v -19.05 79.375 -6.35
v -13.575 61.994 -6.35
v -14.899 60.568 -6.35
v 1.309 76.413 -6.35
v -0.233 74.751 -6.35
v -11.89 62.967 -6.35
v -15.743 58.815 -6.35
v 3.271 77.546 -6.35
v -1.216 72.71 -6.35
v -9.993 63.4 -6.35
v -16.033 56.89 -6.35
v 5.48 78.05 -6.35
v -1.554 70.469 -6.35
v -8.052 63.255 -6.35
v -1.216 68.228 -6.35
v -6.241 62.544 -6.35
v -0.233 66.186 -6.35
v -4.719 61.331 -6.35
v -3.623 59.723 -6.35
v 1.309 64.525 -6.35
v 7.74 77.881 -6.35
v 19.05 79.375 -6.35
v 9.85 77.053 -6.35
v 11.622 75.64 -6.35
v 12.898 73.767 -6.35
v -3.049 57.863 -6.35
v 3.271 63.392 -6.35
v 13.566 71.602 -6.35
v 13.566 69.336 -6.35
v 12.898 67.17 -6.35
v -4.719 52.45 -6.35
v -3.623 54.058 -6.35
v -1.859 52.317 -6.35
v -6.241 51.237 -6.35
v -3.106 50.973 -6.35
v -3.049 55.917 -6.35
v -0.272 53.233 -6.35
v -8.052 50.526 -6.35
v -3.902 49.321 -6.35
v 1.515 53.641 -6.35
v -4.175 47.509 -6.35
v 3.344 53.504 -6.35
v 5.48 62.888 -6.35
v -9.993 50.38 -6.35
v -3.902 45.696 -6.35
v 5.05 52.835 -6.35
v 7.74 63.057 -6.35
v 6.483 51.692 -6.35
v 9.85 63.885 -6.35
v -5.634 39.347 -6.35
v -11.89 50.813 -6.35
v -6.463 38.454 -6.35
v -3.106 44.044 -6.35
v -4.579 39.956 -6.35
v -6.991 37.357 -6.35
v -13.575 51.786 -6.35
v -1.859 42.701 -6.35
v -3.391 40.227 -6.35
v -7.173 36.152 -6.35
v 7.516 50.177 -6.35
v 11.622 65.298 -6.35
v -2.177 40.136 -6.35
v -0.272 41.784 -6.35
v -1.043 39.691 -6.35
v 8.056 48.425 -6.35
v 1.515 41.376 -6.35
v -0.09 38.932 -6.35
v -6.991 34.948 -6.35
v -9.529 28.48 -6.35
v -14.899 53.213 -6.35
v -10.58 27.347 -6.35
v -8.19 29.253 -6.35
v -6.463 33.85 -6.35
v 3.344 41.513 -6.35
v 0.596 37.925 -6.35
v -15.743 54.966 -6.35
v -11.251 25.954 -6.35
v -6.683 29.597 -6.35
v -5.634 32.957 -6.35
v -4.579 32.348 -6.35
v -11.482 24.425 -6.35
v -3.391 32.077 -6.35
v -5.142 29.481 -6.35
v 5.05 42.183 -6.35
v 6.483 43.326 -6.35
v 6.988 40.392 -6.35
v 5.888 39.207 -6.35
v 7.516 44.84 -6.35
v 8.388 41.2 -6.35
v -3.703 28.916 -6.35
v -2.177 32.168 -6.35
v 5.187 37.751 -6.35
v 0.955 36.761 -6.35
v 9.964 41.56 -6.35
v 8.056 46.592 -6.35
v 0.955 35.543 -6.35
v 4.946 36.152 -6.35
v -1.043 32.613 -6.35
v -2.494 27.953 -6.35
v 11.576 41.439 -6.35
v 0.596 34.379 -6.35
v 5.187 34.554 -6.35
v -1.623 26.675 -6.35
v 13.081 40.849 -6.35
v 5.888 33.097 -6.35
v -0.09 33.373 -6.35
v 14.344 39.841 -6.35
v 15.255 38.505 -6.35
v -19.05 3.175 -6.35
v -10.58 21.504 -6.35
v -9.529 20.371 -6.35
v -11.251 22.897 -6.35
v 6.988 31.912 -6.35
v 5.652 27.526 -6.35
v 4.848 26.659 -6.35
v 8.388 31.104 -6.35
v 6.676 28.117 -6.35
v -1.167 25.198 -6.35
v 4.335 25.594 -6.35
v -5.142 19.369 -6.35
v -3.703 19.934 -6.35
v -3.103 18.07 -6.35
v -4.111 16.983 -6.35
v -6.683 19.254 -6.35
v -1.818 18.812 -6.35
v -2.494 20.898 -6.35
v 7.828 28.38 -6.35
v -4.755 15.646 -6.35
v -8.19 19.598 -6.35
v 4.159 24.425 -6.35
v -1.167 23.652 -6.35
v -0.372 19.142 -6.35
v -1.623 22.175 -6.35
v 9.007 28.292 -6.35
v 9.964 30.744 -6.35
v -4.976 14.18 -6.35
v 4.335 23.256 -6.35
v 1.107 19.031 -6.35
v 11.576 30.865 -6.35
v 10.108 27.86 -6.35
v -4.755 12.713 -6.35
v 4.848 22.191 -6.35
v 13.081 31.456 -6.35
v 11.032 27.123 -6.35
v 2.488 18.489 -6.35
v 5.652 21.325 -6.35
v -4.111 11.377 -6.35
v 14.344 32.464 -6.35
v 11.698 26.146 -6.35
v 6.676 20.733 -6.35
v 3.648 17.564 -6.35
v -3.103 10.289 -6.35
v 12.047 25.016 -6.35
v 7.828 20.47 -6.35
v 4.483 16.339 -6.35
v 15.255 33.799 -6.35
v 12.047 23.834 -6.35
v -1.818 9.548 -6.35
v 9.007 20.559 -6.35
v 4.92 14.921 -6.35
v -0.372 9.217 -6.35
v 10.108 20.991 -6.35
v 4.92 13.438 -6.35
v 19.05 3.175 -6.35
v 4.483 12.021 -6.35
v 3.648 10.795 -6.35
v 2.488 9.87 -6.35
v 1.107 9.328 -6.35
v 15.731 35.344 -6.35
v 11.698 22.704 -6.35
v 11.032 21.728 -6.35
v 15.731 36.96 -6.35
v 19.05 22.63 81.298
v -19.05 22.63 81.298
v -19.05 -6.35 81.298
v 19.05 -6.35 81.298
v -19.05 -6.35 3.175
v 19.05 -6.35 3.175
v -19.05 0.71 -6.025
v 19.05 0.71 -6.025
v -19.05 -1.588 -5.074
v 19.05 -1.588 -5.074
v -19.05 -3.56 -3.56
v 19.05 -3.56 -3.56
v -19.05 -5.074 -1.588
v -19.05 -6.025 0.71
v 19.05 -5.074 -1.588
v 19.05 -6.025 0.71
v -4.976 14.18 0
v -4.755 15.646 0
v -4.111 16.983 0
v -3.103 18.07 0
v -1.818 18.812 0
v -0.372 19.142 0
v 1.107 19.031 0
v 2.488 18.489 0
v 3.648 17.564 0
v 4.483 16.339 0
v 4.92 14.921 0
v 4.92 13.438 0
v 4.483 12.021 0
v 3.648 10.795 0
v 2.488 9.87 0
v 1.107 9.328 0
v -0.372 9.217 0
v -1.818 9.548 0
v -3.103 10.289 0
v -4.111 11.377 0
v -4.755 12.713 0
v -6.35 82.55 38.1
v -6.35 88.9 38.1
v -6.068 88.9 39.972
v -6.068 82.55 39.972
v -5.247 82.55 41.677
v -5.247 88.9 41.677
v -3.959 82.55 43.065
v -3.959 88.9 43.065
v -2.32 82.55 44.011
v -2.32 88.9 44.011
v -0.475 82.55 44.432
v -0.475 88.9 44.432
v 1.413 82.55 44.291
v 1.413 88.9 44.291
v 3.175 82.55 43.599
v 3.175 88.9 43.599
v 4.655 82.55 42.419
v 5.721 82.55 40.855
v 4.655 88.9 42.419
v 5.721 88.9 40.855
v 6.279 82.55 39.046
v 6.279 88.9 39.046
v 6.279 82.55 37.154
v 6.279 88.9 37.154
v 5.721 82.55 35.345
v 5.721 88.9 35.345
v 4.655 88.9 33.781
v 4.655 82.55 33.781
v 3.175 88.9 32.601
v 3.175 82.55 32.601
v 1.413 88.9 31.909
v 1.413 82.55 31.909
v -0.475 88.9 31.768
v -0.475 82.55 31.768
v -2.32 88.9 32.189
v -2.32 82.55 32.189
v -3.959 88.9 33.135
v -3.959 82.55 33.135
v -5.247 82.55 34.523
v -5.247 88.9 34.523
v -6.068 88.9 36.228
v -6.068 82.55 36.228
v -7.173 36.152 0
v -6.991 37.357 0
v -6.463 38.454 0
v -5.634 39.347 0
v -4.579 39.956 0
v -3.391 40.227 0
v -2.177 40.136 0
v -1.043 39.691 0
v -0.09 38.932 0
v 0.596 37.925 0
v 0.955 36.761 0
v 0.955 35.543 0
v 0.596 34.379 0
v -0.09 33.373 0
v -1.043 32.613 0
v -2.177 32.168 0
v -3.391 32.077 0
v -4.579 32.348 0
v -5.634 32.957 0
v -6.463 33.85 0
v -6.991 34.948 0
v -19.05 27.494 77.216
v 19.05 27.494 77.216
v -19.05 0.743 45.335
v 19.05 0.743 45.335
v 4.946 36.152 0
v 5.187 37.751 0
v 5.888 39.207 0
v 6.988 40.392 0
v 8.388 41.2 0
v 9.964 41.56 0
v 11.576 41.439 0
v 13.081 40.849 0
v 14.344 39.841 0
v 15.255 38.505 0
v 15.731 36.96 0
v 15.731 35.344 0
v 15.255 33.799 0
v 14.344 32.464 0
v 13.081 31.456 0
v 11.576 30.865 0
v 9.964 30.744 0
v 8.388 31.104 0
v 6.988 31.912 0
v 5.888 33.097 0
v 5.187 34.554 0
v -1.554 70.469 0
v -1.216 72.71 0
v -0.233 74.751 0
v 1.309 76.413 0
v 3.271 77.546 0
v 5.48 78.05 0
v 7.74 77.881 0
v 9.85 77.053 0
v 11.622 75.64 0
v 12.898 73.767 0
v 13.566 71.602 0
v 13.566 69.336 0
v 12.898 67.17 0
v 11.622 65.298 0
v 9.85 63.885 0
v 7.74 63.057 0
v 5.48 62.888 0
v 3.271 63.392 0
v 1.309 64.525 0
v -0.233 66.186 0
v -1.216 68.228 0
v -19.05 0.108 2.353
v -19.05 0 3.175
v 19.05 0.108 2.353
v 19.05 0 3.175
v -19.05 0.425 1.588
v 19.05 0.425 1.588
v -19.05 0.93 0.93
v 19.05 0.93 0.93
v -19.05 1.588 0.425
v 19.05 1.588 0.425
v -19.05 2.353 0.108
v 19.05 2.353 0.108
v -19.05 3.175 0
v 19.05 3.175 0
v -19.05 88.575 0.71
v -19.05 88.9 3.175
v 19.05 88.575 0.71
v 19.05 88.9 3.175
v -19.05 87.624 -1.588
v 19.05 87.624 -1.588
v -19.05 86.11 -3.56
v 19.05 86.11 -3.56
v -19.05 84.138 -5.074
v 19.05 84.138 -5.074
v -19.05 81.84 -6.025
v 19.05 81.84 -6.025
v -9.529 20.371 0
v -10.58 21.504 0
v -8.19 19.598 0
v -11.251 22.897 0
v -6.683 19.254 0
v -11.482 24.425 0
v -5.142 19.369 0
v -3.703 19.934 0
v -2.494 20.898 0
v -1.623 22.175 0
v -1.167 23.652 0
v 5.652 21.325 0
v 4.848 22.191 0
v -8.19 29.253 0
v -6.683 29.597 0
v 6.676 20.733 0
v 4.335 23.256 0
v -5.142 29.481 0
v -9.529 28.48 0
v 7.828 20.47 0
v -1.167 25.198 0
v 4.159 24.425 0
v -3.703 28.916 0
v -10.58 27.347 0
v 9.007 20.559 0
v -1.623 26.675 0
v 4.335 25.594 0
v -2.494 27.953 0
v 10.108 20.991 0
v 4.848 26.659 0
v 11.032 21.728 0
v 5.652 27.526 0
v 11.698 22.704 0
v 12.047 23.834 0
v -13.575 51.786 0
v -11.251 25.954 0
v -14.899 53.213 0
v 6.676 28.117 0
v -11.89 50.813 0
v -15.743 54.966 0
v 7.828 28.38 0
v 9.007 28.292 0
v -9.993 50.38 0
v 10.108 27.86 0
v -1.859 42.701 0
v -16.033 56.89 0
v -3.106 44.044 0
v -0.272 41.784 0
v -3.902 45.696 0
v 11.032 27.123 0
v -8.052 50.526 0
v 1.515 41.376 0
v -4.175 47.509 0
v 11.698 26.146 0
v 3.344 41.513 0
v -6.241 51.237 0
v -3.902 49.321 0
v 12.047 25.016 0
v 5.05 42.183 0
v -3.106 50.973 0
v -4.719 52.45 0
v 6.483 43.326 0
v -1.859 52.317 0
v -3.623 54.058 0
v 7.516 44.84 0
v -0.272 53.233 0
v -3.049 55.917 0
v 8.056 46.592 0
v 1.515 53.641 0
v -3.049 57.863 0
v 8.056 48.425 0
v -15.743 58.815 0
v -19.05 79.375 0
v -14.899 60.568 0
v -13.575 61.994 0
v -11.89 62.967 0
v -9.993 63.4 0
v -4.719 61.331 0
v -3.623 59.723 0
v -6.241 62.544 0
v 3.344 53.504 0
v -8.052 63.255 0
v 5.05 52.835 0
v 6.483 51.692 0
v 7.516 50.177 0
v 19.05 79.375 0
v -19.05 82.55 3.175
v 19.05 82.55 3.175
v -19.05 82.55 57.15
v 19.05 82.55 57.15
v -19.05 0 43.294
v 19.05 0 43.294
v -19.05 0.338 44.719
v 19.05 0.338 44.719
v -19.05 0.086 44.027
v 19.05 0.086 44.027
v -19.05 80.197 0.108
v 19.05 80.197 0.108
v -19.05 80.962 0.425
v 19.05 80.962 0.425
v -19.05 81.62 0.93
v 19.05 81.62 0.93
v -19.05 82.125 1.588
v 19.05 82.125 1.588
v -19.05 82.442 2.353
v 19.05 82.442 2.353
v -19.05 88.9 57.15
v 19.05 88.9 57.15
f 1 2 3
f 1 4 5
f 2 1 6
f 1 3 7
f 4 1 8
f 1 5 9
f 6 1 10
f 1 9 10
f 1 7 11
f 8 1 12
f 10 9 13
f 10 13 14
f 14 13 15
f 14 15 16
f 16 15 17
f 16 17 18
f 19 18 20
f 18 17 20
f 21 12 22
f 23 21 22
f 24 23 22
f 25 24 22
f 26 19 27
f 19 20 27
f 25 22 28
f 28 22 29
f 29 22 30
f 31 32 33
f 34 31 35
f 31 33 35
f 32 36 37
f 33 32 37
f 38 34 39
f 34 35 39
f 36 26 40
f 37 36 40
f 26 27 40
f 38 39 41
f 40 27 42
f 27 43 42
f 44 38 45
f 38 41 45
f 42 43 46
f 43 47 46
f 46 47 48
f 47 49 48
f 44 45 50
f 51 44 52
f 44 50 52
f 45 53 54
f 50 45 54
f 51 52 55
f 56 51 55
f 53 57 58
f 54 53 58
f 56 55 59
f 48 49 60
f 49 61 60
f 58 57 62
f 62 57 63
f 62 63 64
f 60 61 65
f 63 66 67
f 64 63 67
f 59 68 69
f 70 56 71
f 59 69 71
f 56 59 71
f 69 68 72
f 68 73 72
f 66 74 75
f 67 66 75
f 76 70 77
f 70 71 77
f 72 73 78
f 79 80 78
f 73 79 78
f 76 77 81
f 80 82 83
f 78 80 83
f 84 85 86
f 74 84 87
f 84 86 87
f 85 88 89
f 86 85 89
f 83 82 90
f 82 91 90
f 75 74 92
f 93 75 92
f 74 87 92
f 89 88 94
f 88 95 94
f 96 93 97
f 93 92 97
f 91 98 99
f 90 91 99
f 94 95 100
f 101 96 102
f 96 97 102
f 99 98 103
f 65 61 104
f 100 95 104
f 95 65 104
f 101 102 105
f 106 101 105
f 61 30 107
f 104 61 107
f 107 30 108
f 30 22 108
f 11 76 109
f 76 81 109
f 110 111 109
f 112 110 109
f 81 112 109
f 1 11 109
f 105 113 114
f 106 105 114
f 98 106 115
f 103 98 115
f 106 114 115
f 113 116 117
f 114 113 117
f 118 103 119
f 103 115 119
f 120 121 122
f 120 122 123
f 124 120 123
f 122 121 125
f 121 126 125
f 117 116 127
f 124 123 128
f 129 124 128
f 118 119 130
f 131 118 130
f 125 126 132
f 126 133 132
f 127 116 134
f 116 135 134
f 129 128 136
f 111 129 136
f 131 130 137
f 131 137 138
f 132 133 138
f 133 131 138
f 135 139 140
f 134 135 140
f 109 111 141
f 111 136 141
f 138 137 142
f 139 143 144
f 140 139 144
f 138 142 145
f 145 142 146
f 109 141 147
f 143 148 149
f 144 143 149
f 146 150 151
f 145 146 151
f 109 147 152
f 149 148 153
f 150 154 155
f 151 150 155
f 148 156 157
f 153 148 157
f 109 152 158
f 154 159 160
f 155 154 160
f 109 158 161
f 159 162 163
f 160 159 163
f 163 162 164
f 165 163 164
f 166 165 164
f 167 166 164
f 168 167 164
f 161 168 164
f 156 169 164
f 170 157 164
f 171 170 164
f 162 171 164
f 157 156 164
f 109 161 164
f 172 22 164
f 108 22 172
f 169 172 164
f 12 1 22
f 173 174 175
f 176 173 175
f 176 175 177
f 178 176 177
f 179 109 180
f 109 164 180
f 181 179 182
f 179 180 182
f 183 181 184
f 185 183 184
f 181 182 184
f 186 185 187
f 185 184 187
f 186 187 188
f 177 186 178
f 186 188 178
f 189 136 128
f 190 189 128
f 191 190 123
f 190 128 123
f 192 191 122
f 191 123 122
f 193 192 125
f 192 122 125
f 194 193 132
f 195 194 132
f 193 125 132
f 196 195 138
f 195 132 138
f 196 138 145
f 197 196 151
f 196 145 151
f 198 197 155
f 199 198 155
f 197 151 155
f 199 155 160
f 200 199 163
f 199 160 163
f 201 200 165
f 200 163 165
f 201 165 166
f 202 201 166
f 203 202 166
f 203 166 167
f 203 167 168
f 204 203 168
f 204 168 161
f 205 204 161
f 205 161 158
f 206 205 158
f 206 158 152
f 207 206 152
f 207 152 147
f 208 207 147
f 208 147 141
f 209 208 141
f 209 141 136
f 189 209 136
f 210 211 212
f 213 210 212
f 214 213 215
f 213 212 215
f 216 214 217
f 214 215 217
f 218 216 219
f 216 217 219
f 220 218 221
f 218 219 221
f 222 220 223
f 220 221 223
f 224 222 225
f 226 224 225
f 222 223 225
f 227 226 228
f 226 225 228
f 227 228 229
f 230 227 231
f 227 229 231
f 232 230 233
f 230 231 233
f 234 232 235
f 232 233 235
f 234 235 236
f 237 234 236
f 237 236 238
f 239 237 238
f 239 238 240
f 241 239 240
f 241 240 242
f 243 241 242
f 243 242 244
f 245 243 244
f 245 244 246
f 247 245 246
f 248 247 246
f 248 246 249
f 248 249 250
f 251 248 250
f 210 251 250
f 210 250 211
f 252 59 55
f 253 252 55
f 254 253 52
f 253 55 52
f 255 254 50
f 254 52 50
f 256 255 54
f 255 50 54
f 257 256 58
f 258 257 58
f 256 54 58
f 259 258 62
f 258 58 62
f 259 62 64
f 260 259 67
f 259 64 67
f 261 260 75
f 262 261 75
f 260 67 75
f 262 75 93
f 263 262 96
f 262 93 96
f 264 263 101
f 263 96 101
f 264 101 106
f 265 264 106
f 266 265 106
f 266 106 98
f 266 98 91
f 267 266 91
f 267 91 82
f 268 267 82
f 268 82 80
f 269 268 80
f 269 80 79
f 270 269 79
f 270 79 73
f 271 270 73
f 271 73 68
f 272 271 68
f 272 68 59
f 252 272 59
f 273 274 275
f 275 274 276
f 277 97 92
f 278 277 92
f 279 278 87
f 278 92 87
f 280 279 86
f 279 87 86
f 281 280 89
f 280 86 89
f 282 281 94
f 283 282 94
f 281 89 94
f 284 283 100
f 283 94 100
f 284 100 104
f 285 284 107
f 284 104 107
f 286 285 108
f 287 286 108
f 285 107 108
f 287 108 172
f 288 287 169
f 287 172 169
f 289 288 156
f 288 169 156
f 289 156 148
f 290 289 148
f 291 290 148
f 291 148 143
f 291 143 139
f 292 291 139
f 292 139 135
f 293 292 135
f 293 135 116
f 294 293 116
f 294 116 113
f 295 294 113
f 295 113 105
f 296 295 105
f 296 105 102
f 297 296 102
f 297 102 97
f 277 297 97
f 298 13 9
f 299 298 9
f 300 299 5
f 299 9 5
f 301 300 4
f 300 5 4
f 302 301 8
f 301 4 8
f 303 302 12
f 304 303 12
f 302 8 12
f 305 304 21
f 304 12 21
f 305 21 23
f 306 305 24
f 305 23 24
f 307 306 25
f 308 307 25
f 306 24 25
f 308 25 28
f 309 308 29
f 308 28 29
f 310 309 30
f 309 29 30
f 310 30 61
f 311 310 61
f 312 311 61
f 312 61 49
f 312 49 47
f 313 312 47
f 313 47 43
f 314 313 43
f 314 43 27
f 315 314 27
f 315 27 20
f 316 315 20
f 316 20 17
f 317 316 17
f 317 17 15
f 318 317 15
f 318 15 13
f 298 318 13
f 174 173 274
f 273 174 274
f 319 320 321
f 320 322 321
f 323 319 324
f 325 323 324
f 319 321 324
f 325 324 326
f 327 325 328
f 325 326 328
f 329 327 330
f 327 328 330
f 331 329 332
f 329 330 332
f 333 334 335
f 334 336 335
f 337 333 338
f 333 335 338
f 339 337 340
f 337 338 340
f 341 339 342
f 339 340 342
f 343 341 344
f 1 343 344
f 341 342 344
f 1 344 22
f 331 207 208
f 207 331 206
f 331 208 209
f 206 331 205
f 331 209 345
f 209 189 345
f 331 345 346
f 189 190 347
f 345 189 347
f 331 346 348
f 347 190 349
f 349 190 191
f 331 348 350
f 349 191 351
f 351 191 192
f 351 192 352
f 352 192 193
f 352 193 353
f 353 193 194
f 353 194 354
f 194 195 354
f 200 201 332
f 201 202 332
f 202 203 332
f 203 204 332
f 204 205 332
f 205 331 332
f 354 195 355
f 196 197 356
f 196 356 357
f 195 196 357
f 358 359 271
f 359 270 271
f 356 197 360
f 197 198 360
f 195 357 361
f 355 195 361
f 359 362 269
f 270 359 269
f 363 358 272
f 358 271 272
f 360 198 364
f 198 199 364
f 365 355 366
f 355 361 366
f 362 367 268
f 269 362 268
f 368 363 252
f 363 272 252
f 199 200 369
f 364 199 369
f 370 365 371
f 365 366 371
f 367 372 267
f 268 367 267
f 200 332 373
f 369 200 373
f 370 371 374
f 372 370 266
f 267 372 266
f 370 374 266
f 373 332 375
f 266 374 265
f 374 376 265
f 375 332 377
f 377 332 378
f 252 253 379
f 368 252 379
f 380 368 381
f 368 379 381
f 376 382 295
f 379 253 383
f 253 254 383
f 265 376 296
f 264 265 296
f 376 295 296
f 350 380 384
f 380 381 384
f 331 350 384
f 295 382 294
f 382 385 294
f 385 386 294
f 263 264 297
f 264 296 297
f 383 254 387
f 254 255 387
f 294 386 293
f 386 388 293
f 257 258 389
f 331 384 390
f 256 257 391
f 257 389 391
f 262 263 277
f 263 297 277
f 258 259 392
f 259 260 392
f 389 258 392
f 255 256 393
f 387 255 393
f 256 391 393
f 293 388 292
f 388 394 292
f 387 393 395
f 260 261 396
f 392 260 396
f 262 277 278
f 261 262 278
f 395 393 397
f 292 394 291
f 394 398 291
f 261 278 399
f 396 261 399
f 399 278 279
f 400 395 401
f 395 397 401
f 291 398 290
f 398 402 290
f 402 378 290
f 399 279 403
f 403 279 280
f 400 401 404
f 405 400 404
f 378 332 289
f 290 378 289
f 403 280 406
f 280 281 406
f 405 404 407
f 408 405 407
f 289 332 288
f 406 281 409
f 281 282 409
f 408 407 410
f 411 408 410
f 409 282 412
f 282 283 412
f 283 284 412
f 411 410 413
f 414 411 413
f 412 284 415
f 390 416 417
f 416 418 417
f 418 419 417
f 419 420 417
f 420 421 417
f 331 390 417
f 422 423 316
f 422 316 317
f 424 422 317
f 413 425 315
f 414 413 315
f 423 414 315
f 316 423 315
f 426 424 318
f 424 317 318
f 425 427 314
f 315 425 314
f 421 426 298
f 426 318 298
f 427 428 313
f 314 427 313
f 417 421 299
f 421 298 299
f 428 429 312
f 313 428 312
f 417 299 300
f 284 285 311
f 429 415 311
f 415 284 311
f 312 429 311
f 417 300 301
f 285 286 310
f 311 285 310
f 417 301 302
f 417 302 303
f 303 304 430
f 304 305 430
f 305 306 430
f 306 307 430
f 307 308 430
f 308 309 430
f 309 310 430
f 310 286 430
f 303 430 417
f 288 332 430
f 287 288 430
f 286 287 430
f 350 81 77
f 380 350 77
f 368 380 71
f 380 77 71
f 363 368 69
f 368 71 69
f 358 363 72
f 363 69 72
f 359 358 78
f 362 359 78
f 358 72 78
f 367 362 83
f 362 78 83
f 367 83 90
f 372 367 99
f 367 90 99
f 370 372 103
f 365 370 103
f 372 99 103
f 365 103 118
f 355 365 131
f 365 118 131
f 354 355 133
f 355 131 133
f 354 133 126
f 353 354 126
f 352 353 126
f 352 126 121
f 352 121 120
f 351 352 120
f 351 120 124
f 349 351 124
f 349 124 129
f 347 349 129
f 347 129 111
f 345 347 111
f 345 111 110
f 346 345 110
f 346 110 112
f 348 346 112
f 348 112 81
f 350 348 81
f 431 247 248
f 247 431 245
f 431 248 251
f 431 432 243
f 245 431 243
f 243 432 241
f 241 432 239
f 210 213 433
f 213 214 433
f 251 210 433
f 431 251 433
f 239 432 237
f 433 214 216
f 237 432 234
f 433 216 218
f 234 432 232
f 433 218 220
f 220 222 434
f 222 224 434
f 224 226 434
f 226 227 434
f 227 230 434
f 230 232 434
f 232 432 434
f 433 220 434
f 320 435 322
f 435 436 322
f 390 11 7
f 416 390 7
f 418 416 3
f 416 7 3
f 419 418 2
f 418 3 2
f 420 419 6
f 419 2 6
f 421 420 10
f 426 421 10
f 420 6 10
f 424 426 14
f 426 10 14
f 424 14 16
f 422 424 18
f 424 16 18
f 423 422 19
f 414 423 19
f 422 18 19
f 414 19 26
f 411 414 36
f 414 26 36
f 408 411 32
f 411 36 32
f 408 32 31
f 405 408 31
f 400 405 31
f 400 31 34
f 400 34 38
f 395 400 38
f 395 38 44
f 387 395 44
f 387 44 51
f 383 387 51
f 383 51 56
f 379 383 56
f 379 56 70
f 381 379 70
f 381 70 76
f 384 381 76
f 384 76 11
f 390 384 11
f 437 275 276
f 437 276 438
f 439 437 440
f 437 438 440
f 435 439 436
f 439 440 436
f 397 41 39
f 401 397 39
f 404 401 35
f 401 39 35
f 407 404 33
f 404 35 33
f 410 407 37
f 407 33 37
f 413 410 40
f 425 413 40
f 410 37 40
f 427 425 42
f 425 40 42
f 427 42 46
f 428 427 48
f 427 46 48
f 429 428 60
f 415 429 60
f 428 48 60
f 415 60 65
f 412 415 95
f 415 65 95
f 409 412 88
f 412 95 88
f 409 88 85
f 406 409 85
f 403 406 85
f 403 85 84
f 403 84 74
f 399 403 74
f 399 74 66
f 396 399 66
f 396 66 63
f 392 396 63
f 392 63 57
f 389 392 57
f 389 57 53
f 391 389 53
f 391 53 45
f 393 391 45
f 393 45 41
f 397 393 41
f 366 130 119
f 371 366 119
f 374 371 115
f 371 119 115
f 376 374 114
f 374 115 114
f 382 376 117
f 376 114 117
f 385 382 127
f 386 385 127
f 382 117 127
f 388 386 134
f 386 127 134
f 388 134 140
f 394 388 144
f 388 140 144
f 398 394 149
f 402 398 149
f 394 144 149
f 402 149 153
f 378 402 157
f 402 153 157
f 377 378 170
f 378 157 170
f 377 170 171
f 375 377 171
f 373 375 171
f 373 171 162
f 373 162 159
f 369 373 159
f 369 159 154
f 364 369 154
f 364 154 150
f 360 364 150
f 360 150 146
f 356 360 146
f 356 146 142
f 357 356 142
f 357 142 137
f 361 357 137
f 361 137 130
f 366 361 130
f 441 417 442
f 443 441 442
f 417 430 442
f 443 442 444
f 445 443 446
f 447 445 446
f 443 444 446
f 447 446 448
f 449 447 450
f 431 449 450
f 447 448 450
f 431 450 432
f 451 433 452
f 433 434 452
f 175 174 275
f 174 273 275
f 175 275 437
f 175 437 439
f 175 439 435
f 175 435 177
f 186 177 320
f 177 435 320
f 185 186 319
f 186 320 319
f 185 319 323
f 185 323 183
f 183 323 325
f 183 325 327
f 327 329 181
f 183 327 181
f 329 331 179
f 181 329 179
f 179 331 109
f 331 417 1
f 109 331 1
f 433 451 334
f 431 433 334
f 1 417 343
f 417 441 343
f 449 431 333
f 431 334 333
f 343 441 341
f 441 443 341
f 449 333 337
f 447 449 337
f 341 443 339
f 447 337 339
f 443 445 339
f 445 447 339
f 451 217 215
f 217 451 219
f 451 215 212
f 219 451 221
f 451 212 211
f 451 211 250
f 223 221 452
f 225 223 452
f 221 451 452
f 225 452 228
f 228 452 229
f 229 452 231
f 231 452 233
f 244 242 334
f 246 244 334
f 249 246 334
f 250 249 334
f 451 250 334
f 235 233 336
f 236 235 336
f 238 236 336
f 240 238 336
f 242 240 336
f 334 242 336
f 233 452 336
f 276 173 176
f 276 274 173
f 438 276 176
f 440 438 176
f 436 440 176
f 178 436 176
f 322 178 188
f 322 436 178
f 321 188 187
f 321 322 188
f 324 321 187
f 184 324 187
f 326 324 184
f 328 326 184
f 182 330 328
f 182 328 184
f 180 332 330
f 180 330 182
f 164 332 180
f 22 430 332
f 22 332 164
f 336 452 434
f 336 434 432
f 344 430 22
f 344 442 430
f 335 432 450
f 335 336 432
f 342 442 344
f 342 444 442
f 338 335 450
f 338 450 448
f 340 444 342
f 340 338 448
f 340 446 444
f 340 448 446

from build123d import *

# Parameters (mm, degrees)
BASE_EXTRUDE_THIN_DEPTH = 19.05
CUT_EXTRUDE1_REACH      = 97.25
SKETCH2_R               = 6.35
BOSS_EXTRUDE1_START     = -19.05
BOSS_EXTRUDE1_DEPTH     = 38.1
CUT_EXTRUDE2_REACH      = 89.648
SKETCH4_R               = 7.602418737
SKETCH4_R_2             = 6.149803706
SKETCH4_R_3             = 6.52839763
SKETCH4_R_4             = 4.086633044
SKETCH4_R_5             = 3.965992325
SKETCH4_R_6             = 5.18600248
SKETCH4_R_7             = 4.976076495
SKETCH4_R_8             = 5.4229927


with BuildPart() as part:
    # Sketch1 → Base-Extrude-Thin (new body, symmetric)
    with BuildSketch(Plane(origin=(0, 0, 0), x_dir=(0, 0, -1), z_dir=(1, 0, 0))):
        with BuildLine():
            Line((-77.216478592, 27.494340102), (-45.335245167, 0.742808893))
            ThreePointArc((-45.335245167, 0.742808893), (-44.380308461, 0.191475929), (-43.294394506, 0))
            Line((-43.294394506, 0), (-3.175, 0))
            ThreePointArc((-3.175, 0), (-0.92993597, 0.92993597), (0, 3.175))
            Line((0, 3.175), (0, 79.375))
            ThreePointArc((0, 79.375), (-0.92993597, 81.62006403), (-3.175, 82.55))
            Line((-3.175, 82.55), (-57.15, 82.55))
            Line((-57.15, 82.55), (-57.15, 88.9))
            Line((-57.15, 88.9), (-3.175, 88.9))
            ThreePointArc((-3.175, 88.9), (3.560192091, 86.110192091), (6.35, 79.375))
            Line((6.35, 79.375), (6.35, 3.175))
            ThreePointArc((6.35, 3.175), (3.560192091, -3.560192091), (-3.175, -6.35))
            Line((-3.175, -6.35), (-43.294394506, -6.35))
            ThreePointArc((-43.294394506, -6.35), (-46.552136371, -5.775572213), (-49.416946488, -4.121573321))
            Line((-49.416946488, -4.121573321), (-81.298179914, 22.629957888))
            Line((-81.298179914, 22.629957888), (-77.216478592, 27.494340102))
        make_face()
    extrude(amount=BASE_EXTRUDE_THIN_DEPTH, both=True)

    # Sketch2 → Cut-Extrude1 (cut, up to next)
    with BuildSketch(Plane(origin=(0, 88.9, 0), x_dir=(-1, 0, 0), z_dir=(0, 1, 0)), mode=Mode.PRIVATE) as cut_extrude1_sk1:
        with Locations((0, 38.1)):
            Circle(SKETCH2_R)
    cut_extrude1_tool1 = extrude(cut_extrude1_sk1.sketch, amount=-CUT_EXTRUDE1_REACH, mode=Mode.PRIVATE) & part.part
    add(cut_extrude1_tool1.solids().sort_by_distance((0, 88.9, 38.1))[0], mode=Mode.SUBTRACT)

    # Sketch3 → Boss-Extrude1 (add)
    with BuildSketch(Plane(origin=(0, 0, 0), x_dir=(0, 0, -1), z_dir=(1, 0, 0)).offset(BOSS_EXTRUDE1_START)):
        with BuildLine():
            Line((-49.416946488, -4.121573321), (-81.298179914, 22.629957888))
            Line((-81.298179914, 22.629957888), (-81.298179914, -6.35))
            Line((-81.298179914, -6.35), (-43.294394506, -6.35))
            ThreePointArc((-43.294394506, -6.35), (-46.552136371, -5.775572213), (-49.416946488, -4.121573321))
        make_face()
    extrude(amount=BOSS_EXTRUDE1_DEPTH)

    # Sketch4 → Cut-Extrude2 (cut, up to next)
    with BuildSketch(Plane(origin=(0, 0, -6.35), x_dir=(-1, 0, 0), z_dir=(0, 0, -1)), mode=Mode.PRIVATE) as cut_extrude2_sk1:
        with Locations((-6.048622008, 70.468859283)):
            Circle(SKETCH4_R)
    cut_extrude2_tool1 = extrude(cut_extrude2_sk1.sketch, amount=-CUT_EXTRUDE2_REACH, mode=Mode.PRIVATE) & part.part
    add(cut_extrude2_tool1.solids().sort_by_distance((6.048622, 70.468859, -6.35))[0], mode=Mode.SUBTRACT)
    # Sketch4 → Cut-Extrude2 (cut, up to next)
    with BuildSketch(Plane(origin=(0, 0, -6.35), x_dir=(-1, 0, 0), z_dir=(0, 0, -1)), mode=Mode.PRIVATE) as cut_extrude2_sk2:
        with Locations((-1.975060247, 47.508783906)):
            Circle(SKETCH4_R_2)
    cut_extrude2_tool2 = extrude(cut_extrude2_sk2.sketch, amount=-CUT_EXTRUDE2_REACH, mode=Mode.PRIVATE) & part.part
    add(cut_extrude2_tool2.solids().sort_by_distance((1.97506, 47.508784, -6.35))[0], mode=Mode.SUBTRACT)
    # Sketch4 → Cut-Extrude2 (cut, up to next)
    with BuildSketch(Plane(origin=(0, 0, -6.35), x_dir=(-1, 0, 0), z_dir=(0, 0, -1)), mode=Mode.PRIVATE) as cut_extrude2_sk3:
        with Locations((9.504977441, 56.890320082)):
            Circle(SKETCH4_R_3)
    cut_extrude2_tool3 = extrude(cut_extrude2_sk3.sketch, amount=-CUT_EXTRUDE2_REACH, mode=Mode.PRIVATE) & part.part
    add(cut_extrude2_tool3.solids().sort_by_distance((-9.504977, 56.89032, -6.35))[0], mode=Mode.SUBTRACT)
    # Sketch4 → Cut-Extrude2 (cut, up to next)
    with BuildSketch(Plane(origin=(0, 0, -6.35), x_dir=(-1, 0, 0), z_dir=(0, 0, -1)), mode=Mode.PRIVATE) as cut_extrude2_sk4:
        with Locations((3.086031637, 36.152187483)):
            Circle(SKETCH4_R_4)
    cut_extrude2_tool4 = extrude(cut_extrude2_sk4.sketch, amount=-CUT_EXTRUDE2_REACH, mode=Mode.PRIVATE) & part.part
    add(cut_extrude2_tool4.solids().sort_by_distance((-3.086032, 36.152187, -6.35))[0], mode=Mode.SUBTRACT)
    # Sketch4 → Cut-Extrude2 (cut, up to next)
    with BuildSketch(Plane(origin=(0, 0, -6.35), x_dir=(-1, 0, 0), z_dir=(0, 0, -1)), mode=Mode.PRIVATE) as cut_extrude2_sk5:
        with Locations((-8.124863953, 24.425267264)):
            Circle(SKETCH4_R_5)
    cut_extrude2_tool5 = extrude(cut_extrude2_sk5.sketch, amount=-CUT_EXTRUDE2_REACH, mode=Mode.PRIVATE) & part.part
    add(cut_extrude2_tool5.solids().sort_by_distance((8.124864, 24.425267, -6.35))[0], mode=Mode.SUBTRACT)
    # Sketch4 → Cut-Extrude2 (cut, up to next)
    with BuildSketch(Plane(origin=(0, 0, -6.35), x_dir=(-1, 0, 0), z_dir=(0, 0, -1)), mode=Mode.PRIVATE) as cut_extrude2_sk6:
        with Locations((6.295504539, 24.425267264)):
            Circle(SKETCH4_R_6)
    cut_extrude2_tool6 = extrude(cut_extrude2_sk6.sketch, amount=-CUT_EXTRUDE2_REACH, mode=Mode.PRIVATE) & part.part
    add(cut_extrude2_tool6.solids().sort_by_distance((-6.295505, 24.425267, -6.35))[0], mode=Mode.SUBTRACT)
    # Sketch4 → Cut-Extrude2 (cut, up to next)
    with BuildSketch(Plane(origin=(0, 0, -6.35), x_dir=(-1, 0, 0), z_dir=(0, 0, -1)), mode=Mode.PRIVATE) as cut_extrude2_sk7:
        with Locations((0, 14.17964223)):
            Circle(SKETCH4_R_7)
    cut_extrude2_tool7 = extrude(cut_extrude2_sk7.sketch, amount=-CUT_EXTRUDE2_REACH, mode=Mode.PRIVATE) & part.part
    add(cut_extrude2_tool7.solids().sort_by_distance((0, 14.179642, -6.35))[0], mode=Mode.SUBTRACT)
    # Sketch4 → Cut-Extrude2 (cut, up to next)
    with BuildSketch(Plane(origin=(0, 0, -6.35), x_dir=(-1, 0, 0), z_dir=(0, 0, -1)), mode=Mode.PRIVATE) as cut_extrude2_sk8:
        with Locations((-10.369066299, 36.152187483)):
            Circle(SKETCH4_R_8)
    cut_extrude2_tool8 = extrude(cut_extrude2_sk8.sketch, amount=-CUT_EXTRUDE2_REACH, mode=Mode.PRIVATE) & part.part
    add(cut_extrude2_tool8.solids().sort_by_distance((10.369066, 36.152187, -6.35))[0], mode=Mode.SUBTRACT)


solid = part.part
